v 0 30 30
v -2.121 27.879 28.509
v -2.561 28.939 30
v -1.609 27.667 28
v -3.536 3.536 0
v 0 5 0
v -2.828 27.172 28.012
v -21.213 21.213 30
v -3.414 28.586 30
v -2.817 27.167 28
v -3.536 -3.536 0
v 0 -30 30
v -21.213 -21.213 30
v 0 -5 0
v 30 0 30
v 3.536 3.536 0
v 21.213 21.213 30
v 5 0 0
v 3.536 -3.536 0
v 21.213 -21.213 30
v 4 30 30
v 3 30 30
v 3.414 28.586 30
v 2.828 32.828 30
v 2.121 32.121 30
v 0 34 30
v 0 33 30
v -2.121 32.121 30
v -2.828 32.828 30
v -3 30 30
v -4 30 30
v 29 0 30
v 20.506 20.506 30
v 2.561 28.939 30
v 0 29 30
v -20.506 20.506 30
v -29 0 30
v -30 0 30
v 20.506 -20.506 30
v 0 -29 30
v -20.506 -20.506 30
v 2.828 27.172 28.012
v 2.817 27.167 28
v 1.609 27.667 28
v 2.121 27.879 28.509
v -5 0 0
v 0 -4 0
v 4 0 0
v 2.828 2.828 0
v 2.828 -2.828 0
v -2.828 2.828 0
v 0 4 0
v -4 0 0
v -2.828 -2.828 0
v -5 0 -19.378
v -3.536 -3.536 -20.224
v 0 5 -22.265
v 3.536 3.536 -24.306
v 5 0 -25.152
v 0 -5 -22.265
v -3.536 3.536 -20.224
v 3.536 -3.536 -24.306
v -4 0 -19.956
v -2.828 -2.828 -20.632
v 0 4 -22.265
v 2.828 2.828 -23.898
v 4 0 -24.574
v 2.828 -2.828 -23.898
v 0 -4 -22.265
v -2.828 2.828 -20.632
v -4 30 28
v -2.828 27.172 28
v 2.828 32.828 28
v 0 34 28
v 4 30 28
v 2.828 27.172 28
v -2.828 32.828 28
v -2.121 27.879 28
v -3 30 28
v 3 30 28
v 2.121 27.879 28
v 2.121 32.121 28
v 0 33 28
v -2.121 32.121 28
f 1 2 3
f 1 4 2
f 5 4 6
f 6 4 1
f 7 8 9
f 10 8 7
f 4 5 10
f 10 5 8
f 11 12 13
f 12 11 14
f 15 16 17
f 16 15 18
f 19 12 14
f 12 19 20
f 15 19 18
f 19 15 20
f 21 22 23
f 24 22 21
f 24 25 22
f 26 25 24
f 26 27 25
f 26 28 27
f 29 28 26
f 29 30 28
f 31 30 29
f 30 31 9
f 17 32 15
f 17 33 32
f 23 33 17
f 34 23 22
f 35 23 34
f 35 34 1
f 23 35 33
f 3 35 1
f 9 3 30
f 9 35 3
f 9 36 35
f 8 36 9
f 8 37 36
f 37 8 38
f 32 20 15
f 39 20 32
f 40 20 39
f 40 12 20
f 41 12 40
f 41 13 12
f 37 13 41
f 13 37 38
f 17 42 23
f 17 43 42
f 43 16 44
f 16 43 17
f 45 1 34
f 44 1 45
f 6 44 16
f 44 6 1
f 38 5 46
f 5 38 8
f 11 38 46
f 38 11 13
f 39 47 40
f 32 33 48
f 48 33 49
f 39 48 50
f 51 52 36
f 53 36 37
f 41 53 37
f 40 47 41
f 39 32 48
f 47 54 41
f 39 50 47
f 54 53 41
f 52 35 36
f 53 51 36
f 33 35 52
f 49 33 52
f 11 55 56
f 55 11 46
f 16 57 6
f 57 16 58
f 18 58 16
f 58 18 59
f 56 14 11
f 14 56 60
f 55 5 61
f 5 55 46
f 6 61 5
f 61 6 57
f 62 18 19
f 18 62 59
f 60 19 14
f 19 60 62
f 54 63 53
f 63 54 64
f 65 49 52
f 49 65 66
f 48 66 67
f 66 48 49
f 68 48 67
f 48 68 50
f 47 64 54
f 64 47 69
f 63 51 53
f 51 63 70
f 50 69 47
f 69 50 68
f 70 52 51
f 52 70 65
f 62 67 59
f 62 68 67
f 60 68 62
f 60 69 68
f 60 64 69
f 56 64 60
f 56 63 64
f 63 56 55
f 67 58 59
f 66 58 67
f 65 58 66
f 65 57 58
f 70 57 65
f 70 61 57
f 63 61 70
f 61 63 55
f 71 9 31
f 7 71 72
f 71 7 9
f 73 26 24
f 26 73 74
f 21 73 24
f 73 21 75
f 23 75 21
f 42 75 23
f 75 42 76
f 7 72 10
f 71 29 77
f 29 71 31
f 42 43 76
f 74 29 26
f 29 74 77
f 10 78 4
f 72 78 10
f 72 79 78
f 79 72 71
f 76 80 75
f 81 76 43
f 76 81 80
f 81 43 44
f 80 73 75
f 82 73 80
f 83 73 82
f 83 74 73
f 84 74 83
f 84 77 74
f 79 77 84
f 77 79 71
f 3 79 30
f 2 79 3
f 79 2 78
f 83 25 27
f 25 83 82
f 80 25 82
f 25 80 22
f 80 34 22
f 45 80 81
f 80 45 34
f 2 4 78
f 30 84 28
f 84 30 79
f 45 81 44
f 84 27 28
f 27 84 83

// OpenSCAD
//!OpenSCAD

Upper__outer__radius = 30;
tube_outer_radius = 5;
Material_thickness = 1;
tube_length = 30;
funnel_height = 30;
lower_tube_phase_angle = 30;
hang_loop_radius = 3;
funnel_sides = 8;
union(){
  {
    $fn=funnel_sides;    //set sides to funnel_sides
    difference() {
      union(){
        difference() {
          cylinder(r1=tube_outer_radius, r2=Upper__outer__radius, h=funnel_height, center=false);

          cylinder(r1=(tube_outer_radius - Material_thickness), r2=(Upper__outer__radius - Material_thickness), h=funnel_height, center=false);
        }
        translate([0, 0, (tube_length * -1)]){
          difference() {
            cylinder(r1=(tube_outer_radius - 0), r2=(tube_outer_radius - 0), h=tube_length, center=false);

            cylinder(r1=(tube_outer_radius - Material_thickness), r2=(tube_outer_radius - Material_thickness), h=tube_length, center=false);
          }
        }
      }

      translate([0, 0, ((tube_length + 50) * -1)]){
        rotate([0, lower_tube_phase_angle, 0]){
          translate([-20, 0, 0]){
            cube([100, 100, 100], center=true);
          }
        }
      }
    }
  }
  difference() {
    translate([0, Upper__outer__radius, (funnel_height - 2)]){
      difference() {
        cylinder(r1=(hang_loop_radius + Material_thickness), r2=(hang_loop_radius + Material_thickness), h=2, center=false);

        cylinder(r1=hang_loop_radius, r2=hang_loop_radius, h=2, center=false);
      }
    }

    cylinder(r1=(tube_outer_radius - Material_thickness), r2=(Upper__outer__radius - Material_thickness), h=funnel_height, center=false);
  }
}
